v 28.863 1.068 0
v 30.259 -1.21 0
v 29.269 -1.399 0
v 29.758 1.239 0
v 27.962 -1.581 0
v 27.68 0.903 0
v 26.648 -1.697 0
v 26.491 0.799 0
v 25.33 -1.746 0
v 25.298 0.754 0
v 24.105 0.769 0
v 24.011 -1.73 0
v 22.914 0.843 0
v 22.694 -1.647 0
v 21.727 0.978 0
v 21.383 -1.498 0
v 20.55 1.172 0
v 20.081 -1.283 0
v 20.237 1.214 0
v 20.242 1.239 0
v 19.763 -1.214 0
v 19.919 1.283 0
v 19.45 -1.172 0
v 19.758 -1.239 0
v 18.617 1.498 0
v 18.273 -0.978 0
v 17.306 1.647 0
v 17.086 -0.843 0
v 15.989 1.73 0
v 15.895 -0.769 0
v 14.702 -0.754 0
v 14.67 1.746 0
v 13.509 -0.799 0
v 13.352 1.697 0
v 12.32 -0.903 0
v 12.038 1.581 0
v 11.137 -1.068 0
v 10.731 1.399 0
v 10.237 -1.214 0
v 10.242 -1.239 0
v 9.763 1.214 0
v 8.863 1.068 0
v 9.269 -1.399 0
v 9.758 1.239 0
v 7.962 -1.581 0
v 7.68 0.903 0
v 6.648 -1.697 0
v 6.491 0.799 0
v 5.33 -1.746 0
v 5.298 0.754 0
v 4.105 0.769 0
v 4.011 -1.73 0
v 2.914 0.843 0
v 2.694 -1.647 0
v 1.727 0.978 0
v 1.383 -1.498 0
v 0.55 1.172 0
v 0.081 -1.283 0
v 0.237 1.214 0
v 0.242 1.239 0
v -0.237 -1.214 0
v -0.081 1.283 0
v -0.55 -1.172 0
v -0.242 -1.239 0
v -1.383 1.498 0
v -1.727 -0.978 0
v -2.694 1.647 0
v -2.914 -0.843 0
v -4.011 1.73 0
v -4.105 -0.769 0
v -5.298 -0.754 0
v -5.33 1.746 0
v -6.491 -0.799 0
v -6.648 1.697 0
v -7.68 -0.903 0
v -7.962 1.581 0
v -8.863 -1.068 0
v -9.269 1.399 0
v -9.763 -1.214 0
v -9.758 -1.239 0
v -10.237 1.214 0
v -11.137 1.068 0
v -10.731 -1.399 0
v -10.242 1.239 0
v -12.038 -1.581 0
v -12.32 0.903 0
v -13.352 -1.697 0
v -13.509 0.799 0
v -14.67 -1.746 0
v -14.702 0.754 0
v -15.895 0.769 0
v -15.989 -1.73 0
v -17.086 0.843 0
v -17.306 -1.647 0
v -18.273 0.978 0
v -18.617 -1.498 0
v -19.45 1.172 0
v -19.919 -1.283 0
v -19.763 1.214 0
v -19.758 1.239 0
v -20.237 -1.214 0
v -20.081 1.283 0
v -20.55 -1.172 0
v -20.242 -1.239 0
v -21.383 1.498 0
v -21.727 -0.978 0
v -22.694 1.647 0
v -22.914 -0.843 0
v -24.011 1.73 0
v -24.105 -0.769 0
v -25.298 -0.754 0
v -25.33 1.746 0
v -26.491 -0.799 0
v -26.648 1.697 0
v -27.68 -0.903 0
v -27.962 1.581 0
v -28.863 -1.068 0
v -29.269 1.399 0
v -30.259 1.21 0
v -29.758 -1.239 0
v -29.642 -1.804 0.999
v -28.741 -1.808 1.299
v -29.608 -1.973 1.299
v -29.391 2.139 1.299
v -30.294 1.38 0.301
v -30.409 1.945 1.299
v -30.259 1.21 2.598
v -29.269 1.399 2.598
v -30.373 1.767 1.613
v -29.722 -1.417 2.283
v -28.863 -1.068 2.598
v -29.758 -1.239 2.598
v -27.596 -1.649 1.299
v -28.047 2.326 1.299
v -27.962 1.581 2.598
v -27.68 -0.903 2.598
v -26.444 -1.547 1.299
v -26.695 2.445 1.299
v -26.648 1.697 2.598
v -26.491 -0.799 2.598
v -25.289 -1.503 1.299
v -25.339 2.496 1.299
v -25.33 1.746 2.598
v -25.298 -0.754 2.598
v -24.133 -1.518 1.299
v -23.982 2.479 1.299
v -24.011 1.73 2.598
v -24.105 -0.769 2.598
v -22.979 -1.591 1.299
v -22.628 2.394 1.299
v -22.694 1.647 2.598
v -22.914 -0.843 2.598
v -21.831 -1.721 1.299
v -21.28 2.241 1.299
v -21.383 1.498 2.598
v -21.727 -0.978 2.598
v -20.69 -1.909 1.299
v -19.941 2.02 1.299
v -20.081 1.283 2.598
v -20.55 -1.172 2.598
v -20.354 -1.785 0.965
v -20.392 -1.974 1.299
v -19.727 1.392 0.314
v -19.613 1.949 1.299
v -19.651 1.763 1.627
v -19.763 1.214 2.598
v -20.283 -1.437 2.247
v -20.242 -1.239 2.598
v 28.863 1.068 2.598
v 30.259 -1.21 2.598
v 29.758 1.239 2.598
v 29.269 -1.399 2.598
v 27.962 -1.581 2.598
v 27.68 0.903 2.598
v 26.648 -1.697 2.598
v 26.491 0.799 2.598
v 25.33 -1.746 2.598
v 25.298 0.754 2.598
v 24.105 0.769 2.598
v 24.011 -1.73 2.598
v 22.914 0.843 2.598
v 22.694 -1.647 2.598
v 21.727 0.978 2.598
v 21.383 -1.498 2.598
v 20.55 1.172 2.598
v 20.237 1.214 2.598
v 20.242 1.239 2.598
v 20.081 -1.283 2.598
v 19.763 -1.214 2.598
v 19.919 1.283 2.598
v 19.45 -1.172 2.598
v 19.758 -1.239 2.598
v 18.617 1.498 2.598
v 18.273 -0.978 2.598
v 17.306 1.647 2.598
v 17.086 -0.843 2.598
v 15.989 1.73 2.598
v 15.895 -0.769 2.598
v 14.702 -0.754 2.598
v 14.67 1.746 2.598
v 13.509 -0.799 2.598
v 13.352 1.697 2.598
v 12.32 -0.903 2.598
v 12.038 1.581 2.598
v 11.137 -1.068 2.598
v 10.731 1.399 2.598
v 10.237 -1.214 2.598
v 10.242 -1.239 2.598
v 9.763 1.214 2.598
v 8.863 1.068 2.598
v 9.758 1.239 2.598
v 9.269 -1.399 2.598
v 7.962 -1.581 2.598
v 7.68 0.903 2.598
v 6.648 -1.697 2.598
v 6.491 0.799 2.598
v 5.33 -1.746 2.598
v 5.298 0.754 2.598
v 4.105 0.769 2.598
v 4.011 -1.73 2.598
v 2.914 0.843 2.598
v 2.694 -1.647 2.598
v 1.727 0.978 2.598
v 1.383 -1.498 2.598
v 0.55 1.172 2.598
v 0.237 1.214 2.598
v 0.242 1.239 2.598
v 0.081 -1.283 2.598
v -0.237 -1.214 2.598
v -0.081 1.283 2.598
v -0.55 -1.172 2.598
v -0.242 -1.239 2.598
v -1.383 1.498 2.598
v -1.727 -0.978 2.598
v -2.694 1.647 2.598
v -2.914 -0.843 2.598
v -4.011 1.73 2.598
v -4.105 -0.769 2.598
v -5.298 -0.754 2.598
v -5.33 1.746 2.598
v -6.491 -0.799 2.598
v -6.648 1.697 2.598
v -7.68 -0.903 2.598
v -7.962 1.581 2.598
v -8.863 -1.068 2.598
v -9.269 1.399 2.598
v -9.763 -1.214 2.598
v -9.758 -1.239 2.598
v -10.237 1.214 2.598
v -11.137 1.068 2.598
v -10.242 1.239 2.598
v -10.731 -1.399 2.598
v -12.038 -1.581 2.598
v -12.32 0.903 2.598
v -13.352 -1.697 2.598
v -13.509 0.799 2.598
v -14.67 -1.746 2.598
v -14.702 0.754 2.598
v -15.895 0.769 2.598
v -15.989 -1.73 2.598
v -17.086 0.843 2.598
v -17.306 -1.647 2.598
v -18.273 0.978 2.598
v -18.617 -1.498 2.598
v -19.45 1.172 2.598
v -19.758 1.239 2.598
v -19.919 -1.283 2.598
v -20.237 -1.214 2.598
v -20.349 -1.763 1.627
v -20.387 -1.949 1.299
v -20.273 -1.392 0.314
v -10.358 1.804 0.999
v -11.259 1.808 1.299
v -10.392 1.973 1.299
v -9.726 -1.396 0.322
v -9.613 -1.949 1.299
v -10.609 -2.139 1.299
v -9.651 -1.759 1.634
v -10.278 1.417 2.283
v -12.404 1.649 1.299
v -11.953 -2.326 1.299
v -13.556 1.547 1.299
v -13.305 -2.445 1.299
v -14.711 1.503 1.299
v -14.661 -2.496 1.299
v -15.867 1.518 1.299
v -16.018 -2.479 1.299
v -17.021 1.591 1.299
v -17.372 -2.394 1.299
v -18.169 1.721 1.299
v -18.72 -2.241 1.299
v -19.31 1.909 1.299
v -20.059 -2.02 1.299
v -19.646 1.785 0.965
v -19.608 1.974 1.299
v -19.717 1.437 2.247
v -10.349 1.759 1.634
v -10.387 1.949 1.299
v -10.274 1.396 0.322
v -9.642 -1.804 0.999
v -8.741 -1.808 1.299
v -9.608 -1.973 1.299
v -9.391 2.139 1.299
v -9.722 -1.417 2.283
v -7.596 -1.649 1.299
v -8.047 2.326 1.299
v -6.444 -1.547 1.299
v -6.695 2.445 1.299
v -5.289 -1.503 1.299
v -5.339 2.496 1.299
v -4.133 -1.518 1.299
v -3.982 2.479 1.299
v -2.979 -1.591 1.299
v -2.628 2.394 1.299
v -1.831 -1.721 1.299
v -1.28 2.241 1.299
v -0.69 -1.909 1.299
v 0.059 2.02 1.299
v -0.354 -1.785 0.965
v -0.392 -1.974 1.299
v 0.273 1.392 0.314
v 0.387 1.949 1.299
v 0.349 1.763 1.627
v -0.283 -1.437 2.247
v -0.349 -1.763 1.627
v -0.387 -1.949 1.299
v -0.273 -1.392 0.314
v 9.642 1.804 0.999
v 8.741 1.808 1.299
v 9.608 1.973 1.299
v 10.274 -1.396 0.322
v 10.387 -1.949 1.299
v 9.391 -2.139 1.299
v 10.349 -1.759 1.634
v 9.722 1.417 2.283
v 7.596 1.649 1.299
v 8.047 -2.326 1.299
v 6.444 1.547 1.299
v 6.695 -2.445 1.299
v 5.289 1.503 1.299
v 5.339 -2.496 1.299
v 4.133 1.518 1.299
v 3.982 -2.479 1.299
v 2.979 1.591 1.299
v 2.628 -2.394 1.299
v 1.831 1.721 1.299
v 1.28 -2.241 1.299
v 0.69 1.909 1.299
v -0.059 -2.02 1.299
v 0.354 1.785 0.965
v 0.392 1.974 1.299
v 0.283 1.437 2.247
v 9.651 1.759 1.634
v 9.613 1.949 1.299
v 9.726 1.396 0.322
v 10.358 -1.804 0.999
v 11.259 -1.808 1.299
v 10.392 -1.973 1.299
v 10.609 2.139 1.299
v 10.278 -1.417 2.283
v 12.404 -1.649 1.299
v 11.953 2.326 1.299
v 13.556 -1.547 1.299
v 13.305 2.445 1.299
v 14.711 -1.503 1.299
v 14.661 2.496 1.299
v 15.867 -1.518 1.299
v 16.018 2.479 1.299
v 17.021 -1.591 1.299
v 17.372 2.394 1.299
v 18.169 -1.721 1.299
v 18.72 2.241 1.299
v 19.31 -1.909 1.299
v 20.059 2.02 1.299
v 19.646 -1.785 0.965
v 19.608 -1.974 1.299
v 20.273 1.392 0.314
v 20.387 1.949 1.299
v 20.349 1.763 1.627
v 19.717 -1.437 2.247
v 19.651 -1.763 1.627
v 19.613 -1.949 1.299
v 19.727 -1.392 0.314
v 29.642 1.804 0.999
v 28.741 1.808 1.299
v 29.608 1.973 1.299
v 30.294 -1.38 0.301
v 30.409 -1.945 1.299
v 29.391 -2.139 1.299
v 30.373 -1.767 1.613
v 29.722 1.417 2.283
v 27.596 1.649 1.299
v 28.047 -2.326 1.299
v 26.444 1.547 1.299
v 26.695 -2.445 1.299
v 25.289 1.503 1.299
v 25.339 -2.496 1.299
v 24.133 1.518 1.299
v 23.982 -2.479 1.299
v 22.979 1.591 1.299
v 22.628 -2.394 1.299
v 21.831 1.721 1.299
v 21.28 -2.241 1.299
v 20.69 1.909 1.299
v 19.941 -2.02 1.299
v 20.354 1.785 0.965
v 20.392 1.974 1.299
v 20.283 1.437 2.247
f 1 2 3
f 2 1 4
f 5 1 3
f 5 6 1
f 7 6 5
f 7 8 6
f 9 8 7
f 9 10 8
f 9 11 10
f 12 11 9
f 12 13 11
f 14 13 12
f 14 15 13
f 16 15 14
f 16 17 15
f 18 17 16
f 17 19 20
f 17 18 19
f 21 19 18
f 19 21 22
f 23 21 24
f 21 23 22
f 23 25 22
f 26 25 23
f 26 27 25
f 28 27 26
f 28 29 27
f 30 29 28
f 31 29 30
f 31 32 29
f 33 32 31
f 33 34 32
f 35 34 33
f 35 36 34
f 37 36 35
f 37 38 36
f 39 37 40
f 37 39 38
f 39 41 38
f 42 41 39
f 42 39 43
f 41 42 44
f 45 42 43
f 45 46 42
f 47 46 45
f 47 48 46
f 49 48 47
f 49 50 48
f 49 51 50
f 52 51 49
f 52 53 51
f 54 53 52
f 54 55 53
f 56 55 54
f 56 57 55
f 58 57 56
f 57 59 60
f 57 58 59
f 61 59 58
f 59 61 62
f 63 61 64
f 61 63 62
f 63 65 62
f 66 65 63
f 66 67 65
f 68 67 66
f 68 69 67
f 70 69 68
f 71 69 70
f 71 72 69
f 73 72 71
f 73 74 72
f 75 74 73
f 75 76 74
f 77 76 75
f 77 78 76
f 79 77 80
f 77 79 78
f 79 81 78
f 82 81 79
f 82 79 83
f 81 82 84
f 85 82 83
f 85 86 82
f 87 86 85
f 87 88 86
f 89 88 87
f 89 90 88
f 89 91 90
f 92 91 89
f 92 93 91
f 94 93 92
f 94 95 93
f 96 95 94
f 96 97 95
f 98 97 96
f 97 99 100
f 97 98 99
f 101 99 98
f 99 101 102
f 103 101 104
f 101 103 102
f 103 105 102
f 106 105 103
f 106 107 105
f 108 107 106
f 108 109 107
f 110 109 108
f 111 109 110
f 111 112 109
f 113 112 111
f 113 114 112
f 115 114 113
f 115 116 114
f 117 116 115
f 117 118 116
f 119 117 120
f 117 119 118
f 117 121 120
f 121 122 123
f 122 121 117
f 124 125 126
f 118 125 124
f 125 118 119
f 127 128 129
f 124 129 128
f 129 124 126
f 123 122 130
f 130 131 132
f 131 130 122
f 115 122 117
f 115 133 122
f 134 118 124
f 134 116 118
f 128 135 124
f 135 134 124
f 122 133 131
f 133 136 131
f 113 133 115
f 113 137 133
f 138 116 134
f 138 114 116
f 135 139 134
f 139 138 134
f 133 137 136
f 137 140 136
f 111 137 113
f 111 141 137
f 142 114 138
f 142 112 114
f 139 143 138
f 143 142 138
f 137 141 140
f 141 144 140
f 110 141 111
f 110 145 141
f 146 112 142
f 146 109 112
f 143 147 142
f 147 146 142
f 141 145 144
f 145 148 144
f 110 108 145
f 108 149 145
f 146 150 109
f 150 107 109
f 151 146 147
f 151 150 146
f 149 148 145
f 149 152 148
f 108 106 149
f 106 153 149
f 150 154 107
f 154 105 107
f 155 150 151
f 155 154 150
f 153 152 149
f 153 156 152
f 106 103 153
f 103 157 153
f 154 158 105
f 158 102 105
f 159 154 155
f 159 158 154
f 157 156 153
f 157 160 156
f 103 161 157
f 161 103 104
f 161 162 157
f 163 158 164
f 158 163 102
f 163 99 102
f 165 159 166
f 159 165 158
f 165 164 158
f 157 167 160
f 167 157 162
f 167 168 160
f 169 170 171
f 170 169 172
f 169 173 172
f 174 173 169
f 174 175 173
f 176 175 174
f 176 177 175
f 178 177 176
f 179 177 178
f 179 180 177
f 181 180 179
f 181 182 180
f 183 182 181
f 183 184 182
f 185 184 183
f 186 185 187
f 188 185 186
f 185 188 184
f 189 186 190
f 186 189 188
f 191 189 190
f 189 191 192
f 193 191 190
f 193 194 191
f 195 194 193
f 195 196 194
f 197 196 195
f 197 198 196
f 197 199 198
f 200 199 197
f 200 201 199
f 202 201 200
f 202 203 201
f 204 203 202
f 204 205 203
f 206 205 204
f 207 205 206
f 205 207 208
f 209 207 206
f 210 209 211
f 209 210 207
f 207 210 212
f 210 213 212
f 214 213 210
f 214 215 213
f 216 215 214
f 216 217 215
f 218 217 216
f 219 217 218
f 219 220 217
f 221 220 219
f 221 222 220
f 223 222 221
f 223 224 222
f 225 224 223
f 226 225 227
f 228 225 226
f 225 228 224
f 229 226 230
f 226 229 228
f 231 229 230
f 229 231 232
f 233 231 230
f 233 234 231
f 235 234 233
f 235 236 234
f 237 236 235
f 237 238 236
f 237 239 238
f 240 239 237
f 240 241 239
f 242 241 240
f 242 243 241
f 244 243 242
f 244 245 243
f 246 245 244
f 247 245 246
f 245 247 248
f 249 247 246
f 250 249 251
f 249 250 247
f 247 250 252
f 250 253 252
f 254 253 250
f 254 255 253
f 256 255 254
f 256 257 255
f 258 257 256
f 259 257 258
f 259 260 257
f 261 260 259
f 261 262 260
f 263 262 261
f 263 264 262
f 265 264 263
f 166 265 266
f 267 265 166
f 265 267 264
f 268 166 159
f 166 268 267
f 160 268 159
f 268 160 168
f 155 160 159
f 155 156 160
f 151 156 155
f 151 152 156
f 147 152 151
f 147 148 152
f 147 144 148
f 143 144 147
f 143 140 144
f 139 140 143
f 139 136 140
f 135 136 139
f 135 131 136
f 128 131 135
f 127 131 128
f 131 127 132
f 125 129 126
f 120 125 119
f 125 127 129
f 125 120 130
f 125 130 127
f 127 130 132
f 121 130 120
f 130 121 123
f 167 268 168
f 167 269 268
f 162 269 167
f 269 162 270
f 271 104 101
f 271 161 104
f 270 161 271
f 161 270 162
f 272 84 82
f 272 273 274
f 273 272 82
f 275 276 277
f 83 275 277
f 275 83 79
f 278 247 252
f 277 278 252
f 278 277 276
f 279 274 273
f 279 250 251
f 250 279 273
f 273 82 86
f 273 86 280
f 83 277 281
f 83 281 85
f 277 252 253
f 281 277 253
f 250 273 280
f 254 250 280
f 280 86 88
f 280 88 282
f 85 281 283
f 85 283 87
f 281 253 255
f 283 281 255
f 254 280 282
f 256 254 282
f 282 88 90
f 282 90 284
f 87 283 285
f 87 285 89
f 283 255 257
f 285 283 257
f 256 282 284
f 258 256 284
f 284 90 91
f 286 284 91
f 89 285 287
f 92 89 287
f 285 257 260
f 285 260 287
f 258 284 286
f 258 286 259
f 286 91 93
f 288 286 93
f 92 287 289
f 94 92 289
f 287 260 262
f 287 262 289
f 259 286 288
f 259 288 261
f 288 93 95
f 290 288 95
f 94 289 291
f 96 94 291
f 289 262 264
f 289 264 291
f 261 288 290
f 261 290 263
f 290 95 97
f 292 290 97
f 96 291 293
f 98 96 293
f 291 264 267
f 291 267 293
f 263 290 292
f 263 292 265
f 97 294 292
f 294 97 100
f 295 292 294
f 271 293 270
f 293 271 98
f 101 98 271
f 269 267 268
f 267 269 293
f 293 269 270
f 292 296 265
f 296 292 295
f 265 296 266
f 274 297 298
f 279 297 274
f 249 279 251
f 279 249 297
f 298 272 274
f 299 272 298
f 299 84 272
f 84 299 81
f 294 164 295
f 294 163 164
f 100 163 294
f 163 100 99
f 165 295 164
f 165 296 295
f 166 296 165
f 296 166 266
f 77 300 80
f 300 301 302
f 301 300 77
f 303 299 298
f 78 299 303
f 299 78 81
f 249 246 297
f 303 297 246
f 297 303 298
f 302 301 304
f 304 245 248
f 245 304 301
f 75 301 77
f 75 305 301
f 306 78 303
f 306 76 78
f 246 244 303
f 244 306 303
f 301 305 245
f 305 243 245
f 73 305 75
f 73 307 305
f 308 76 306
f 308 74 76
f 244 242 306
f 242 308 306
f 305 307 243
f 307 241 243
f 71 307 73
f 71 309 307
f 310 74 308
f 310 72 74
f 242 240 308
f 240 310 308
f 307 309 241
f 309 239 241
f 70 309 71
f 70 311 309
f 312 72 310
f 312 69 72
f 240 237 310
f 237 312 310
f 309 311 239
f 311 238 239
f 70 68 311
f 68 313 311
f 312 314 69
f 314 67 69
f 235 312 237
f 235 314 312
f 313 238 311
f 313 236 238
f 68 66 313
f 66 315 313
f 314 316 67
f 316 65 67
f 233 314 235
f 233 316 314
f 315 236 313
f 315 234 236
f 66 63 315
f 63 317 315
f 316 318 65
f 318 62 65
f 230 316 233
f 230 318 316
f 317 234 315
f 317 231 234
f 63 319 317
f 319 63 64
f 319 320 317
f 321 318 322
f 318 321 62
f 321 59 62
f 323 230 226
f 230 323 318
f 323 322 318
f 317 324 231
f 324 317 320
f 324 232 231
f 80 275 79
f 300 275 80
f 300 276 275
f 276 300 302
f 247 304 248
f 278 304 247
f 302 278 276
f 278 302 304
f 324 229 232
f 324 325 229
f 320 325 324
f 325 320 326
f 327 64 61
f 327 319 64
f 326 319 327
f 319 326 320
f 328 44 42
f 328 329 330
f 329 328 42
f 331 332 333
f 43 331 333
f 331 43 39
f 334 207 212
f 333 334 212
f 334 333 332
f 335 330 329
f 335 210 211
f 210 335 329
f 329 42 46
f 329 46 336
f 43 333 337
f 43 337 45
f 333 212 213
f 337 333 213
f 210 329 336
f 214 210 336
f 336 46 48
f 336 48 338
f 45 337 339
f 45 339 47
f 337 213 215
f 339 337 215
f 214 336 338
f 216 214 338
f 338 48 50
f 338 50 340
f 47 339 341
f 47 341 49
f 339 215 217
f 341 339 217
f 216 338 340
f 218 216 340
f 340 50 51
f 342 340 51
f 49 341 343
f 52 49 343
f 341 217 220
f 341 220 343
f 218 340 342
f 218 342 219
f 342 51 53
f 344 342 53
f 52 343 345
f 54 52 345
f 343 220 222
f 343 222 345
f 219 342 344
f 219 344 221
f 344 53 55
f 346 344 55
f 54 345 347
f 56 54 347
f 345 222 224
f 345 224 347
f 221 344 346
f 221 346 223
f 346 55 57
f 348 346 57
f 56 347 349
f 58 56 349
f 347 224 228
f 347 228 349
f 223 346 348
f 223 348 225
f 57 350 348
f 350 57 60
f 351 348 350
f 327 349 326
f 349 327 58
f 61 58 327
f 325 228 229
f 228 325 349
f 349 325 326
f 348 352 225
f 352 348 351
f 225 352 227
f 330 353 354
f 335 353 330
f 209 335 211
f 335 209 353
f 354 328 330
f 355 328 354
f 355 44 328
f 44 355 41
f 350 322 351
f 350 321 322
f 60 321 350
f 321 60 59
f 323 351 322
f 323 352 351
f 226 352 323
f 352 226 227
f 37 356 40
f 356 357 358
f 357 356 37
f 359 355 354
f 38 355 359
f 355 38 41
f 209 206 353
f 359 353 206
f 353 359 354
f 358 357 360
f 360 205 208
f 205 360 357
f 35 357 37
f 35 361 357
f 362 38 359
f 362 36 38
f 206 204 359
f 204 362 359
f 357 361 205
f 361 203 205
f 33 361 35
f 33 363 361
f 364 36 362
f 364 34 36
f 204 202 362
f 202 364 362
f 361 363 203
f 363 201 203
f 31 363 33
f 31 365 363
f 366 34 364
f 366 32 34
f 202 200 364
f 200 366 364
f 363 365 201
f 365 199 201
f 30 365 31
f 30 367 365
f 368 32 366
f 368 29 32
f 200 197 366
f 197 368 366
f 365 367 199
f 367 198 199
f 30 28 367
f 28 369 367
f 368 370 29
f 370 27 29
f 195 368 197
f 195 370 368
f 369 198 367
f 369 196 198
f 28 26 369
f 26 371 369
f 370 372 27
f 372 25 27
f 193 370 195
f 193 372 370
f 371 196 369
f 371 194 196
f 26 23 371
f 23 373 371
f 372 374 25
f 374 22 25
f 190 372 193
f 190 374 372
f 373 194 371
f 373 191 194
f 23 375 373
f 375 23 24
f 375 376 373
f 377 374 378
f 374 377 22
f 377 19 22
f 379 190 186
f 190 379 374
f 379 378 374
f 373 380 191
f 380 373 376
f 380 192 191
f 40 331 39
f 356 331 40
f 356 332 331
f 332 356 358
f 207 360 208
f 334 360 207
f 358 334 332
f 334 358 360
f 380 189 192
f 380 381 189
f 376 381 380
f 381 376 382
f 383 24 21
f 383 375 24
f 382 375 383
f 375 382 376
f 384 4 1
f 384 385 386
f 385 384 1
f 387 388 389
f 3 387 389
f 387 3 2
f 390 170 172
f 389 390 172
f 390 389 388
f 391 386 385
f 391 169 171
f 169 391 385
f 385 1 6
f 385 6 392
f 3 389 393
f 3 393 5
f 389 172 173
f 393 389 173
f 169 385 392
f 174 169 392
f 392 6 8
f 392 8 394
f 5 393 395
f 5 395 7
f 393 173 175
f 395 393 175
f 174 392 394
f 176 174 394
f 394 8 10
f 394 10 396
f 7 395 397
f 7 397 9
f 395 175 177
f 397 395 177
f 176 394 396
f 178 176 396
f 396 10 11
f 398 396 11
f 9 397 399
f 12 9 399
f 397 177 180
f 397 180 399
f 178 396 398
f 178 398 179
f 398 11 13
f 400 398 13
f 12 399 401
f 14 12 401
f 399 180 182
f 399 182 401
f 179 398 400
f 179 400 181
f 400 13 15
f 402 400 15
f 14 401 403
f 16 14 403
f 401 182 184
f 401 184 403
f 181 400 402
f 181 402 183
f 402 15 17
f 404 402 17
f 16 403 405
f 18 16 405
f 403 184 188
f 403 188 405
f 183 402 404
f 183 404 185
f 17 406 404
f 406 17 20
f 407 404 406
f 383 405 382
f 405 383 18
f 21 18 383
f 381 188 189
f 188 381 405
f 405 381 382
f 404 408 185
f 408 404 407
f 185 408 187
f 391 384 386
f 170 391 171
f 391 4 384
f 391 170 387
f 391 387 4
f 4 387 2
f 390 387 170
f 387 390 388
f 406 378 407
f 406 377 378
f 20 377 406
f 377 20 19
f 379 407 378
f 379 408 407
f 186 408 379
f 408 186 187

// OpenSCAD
// gyroid puzzle

L=20*1;// height of gyroid module will be L*sqrt(2)
d=L/3;// diameter of base clasps
tol=0.25*1;// tolerance on base clasps

//gyroid();
//base();

//Number of wiggles
n=3;
//Adjust the fit (positive makes it looser)
fit=0;

translate([-L*n/2,0,(3-fit)*sqrt(3)/4])connector(3-fit,4-fit,n);

// Assembly inputs: (n,type), where:
// n is the number of modules along each edge
// type = 0 to show rhombic dodecahedrons only
// type = 1 to show actual pieces
//assembly(4,1);// modules only
//totalAssembly(5,1);// modules and base modules
//attach();// animation of connectors twisting through gyroid

module attach(){
//block();
color([1,0,0])translate([-L-L/8,L/8,3*L/8])connector(3,4,3);
color([0,1,0])translate([L/8,3*L/8,L+L/8])rotate([0,90,0])connector(3,4,3);
color([0,0,1])translate([3*L/8,-L+L/8,L/8])rotate([0,0,90])connector(3,4,3);
}

module connector(h,w,n)
assign(R=L*L/(w-h)/16,theta=4*(w-h)/L*180/PI)
translate([-$t*L,0,0])rotate([$t*360,0,0])render()
for(i=[0:2*n-1])translate([L/2*i+L/4,0,0])rotate([0,0,i*180])
translate([0,-R*cos(theta),0])intersection(){
	rotate_extrude($fn=360/theta*4)translate([R,0])union(){
		translate([(w-h)/2,0])circle(r=h/2,$fn=6);
		translate([(h-w)/2,0])circle(r=h/2,$fn=6);
	}
	rotate([0,0,theta+0.1])translate([0,0,-R])cube(2*R);
	rotate([0,0,90-theta-0.1])translate([0,0,-R])cube(2*R);
}

module rhombDodeca(){
intersection(){
	rotate([0,0,45])cube(L*sqrt(2)*[1,1,2],center=true);
	rotate([0,45,0])cube(L*sqrt(2)*[1,2,1],center=true);
	rotate([45,0,0])cube(L*sqrt(2)*[2,1,1],center=true);
}}

module gyroid(){
translate([0,0,L/sqrt(2)])rotate([-45,0,90])
intersection(){
	scale(L/50)difference(){
		import("gyroidThick1.stl",convexity=10);
		import("gyroidThin1.stl",convexity=10);
	}
	rhombDodeca();
}}

module gyroid1(){
translate([0,0,L/sqrt(2)])rotate([-45,0,90])
intersection(){
	scale(L/50)difference(){
		import("gyroidThick1.stl",convexity=10);
		import("gyroidHalf1.stl",convexity=10);
	}
	rhombDodeca();
}}

module gyroid2(){
translate([0,0,L/sqrt(2)])rotate([-45,0,90])
intersection(){
	scale(L/50)difference(){
		import("gyroidHalf1.stl",convexity=10);
		import("gyroidThin1.stl",convexity=10);
	}
	rhombDodeca();
}}

module block(){
rotate([45,0,0])rotate([0,0,-90])translate(-[0,0,L/sqrt(2)])import("gyroidpuzzle.stl",convexity=10);
}

module assembly(n,type){
rotate([-acos(1/sqrt(3)),0,0])rotate([0,0,-45])translate(-L*(n-1)/2*[1,1,1])
	for(k=[0:n-1]){
	for(j=[0:n-1-k]){
	for(i=[0:n-1-k-j]){
		color([(i+1)/n,(j+1)/n,(k+1)/n])translate(i*[L,L,0]+j*[L,0,L]+k*[0,L,L])
			if(type==0) rhombDodeca(); else block();
	}}}
}

module base(){
render()
intersection(){
	translate([0,0,-L*3/4])rotate([180,0,0])union(){assembly(3,0);}
	translate([0,0,L])cube(2*L,center=true);
	difference(){
		union(){
			translate([0,0,L/4])rotate([-acos(1/sqrt(3)),0,0])rotate([0,0,-45])rhombDodeca();
			for(i=[0:5])rotate([0,0,i*60])translate([L/sqrt(2),0,-1])
				rotate([0,0,-45])translate([0,d/2,0])cylinder(r=d/2-tol/2,h=L,$fn=20);
		}
		for(i=[0:5])rotate([0,0,i*60])translate([L/sqrt(2),0,-1])
			rotate([0,0,-45])translate([0,-d/2,0])cylinder(r=d/2+tol/2,h=L,$fn=20);
	}
}}

module baseAssembly(n){
rotate([-acos(1/sqrt(3)),0,0])rotate([0,0,-45])translate(-L*(n-1)/2*[1,1,1])
	for(k=[0:n-1]){
	for(i=[0:n-1-k]){
		color([(i+1)/n,0,(k+1)/n])translate(i*[L,L,0]+k*[0,L,L])
			rotate([0,0,45])rotate([acos(1/sqrt(3)),0,0])base();
	}}
}

module totalAssembly(n,type){
assembly(n,type);
translate([0,0,-L])baseAssembly(n);
echo(str("Requires ",(n*n+n)/2," base modules"));
echo(str("Requires ",(n*n*n+3*n*n+2*n)/6," gyroid modules"));
}
